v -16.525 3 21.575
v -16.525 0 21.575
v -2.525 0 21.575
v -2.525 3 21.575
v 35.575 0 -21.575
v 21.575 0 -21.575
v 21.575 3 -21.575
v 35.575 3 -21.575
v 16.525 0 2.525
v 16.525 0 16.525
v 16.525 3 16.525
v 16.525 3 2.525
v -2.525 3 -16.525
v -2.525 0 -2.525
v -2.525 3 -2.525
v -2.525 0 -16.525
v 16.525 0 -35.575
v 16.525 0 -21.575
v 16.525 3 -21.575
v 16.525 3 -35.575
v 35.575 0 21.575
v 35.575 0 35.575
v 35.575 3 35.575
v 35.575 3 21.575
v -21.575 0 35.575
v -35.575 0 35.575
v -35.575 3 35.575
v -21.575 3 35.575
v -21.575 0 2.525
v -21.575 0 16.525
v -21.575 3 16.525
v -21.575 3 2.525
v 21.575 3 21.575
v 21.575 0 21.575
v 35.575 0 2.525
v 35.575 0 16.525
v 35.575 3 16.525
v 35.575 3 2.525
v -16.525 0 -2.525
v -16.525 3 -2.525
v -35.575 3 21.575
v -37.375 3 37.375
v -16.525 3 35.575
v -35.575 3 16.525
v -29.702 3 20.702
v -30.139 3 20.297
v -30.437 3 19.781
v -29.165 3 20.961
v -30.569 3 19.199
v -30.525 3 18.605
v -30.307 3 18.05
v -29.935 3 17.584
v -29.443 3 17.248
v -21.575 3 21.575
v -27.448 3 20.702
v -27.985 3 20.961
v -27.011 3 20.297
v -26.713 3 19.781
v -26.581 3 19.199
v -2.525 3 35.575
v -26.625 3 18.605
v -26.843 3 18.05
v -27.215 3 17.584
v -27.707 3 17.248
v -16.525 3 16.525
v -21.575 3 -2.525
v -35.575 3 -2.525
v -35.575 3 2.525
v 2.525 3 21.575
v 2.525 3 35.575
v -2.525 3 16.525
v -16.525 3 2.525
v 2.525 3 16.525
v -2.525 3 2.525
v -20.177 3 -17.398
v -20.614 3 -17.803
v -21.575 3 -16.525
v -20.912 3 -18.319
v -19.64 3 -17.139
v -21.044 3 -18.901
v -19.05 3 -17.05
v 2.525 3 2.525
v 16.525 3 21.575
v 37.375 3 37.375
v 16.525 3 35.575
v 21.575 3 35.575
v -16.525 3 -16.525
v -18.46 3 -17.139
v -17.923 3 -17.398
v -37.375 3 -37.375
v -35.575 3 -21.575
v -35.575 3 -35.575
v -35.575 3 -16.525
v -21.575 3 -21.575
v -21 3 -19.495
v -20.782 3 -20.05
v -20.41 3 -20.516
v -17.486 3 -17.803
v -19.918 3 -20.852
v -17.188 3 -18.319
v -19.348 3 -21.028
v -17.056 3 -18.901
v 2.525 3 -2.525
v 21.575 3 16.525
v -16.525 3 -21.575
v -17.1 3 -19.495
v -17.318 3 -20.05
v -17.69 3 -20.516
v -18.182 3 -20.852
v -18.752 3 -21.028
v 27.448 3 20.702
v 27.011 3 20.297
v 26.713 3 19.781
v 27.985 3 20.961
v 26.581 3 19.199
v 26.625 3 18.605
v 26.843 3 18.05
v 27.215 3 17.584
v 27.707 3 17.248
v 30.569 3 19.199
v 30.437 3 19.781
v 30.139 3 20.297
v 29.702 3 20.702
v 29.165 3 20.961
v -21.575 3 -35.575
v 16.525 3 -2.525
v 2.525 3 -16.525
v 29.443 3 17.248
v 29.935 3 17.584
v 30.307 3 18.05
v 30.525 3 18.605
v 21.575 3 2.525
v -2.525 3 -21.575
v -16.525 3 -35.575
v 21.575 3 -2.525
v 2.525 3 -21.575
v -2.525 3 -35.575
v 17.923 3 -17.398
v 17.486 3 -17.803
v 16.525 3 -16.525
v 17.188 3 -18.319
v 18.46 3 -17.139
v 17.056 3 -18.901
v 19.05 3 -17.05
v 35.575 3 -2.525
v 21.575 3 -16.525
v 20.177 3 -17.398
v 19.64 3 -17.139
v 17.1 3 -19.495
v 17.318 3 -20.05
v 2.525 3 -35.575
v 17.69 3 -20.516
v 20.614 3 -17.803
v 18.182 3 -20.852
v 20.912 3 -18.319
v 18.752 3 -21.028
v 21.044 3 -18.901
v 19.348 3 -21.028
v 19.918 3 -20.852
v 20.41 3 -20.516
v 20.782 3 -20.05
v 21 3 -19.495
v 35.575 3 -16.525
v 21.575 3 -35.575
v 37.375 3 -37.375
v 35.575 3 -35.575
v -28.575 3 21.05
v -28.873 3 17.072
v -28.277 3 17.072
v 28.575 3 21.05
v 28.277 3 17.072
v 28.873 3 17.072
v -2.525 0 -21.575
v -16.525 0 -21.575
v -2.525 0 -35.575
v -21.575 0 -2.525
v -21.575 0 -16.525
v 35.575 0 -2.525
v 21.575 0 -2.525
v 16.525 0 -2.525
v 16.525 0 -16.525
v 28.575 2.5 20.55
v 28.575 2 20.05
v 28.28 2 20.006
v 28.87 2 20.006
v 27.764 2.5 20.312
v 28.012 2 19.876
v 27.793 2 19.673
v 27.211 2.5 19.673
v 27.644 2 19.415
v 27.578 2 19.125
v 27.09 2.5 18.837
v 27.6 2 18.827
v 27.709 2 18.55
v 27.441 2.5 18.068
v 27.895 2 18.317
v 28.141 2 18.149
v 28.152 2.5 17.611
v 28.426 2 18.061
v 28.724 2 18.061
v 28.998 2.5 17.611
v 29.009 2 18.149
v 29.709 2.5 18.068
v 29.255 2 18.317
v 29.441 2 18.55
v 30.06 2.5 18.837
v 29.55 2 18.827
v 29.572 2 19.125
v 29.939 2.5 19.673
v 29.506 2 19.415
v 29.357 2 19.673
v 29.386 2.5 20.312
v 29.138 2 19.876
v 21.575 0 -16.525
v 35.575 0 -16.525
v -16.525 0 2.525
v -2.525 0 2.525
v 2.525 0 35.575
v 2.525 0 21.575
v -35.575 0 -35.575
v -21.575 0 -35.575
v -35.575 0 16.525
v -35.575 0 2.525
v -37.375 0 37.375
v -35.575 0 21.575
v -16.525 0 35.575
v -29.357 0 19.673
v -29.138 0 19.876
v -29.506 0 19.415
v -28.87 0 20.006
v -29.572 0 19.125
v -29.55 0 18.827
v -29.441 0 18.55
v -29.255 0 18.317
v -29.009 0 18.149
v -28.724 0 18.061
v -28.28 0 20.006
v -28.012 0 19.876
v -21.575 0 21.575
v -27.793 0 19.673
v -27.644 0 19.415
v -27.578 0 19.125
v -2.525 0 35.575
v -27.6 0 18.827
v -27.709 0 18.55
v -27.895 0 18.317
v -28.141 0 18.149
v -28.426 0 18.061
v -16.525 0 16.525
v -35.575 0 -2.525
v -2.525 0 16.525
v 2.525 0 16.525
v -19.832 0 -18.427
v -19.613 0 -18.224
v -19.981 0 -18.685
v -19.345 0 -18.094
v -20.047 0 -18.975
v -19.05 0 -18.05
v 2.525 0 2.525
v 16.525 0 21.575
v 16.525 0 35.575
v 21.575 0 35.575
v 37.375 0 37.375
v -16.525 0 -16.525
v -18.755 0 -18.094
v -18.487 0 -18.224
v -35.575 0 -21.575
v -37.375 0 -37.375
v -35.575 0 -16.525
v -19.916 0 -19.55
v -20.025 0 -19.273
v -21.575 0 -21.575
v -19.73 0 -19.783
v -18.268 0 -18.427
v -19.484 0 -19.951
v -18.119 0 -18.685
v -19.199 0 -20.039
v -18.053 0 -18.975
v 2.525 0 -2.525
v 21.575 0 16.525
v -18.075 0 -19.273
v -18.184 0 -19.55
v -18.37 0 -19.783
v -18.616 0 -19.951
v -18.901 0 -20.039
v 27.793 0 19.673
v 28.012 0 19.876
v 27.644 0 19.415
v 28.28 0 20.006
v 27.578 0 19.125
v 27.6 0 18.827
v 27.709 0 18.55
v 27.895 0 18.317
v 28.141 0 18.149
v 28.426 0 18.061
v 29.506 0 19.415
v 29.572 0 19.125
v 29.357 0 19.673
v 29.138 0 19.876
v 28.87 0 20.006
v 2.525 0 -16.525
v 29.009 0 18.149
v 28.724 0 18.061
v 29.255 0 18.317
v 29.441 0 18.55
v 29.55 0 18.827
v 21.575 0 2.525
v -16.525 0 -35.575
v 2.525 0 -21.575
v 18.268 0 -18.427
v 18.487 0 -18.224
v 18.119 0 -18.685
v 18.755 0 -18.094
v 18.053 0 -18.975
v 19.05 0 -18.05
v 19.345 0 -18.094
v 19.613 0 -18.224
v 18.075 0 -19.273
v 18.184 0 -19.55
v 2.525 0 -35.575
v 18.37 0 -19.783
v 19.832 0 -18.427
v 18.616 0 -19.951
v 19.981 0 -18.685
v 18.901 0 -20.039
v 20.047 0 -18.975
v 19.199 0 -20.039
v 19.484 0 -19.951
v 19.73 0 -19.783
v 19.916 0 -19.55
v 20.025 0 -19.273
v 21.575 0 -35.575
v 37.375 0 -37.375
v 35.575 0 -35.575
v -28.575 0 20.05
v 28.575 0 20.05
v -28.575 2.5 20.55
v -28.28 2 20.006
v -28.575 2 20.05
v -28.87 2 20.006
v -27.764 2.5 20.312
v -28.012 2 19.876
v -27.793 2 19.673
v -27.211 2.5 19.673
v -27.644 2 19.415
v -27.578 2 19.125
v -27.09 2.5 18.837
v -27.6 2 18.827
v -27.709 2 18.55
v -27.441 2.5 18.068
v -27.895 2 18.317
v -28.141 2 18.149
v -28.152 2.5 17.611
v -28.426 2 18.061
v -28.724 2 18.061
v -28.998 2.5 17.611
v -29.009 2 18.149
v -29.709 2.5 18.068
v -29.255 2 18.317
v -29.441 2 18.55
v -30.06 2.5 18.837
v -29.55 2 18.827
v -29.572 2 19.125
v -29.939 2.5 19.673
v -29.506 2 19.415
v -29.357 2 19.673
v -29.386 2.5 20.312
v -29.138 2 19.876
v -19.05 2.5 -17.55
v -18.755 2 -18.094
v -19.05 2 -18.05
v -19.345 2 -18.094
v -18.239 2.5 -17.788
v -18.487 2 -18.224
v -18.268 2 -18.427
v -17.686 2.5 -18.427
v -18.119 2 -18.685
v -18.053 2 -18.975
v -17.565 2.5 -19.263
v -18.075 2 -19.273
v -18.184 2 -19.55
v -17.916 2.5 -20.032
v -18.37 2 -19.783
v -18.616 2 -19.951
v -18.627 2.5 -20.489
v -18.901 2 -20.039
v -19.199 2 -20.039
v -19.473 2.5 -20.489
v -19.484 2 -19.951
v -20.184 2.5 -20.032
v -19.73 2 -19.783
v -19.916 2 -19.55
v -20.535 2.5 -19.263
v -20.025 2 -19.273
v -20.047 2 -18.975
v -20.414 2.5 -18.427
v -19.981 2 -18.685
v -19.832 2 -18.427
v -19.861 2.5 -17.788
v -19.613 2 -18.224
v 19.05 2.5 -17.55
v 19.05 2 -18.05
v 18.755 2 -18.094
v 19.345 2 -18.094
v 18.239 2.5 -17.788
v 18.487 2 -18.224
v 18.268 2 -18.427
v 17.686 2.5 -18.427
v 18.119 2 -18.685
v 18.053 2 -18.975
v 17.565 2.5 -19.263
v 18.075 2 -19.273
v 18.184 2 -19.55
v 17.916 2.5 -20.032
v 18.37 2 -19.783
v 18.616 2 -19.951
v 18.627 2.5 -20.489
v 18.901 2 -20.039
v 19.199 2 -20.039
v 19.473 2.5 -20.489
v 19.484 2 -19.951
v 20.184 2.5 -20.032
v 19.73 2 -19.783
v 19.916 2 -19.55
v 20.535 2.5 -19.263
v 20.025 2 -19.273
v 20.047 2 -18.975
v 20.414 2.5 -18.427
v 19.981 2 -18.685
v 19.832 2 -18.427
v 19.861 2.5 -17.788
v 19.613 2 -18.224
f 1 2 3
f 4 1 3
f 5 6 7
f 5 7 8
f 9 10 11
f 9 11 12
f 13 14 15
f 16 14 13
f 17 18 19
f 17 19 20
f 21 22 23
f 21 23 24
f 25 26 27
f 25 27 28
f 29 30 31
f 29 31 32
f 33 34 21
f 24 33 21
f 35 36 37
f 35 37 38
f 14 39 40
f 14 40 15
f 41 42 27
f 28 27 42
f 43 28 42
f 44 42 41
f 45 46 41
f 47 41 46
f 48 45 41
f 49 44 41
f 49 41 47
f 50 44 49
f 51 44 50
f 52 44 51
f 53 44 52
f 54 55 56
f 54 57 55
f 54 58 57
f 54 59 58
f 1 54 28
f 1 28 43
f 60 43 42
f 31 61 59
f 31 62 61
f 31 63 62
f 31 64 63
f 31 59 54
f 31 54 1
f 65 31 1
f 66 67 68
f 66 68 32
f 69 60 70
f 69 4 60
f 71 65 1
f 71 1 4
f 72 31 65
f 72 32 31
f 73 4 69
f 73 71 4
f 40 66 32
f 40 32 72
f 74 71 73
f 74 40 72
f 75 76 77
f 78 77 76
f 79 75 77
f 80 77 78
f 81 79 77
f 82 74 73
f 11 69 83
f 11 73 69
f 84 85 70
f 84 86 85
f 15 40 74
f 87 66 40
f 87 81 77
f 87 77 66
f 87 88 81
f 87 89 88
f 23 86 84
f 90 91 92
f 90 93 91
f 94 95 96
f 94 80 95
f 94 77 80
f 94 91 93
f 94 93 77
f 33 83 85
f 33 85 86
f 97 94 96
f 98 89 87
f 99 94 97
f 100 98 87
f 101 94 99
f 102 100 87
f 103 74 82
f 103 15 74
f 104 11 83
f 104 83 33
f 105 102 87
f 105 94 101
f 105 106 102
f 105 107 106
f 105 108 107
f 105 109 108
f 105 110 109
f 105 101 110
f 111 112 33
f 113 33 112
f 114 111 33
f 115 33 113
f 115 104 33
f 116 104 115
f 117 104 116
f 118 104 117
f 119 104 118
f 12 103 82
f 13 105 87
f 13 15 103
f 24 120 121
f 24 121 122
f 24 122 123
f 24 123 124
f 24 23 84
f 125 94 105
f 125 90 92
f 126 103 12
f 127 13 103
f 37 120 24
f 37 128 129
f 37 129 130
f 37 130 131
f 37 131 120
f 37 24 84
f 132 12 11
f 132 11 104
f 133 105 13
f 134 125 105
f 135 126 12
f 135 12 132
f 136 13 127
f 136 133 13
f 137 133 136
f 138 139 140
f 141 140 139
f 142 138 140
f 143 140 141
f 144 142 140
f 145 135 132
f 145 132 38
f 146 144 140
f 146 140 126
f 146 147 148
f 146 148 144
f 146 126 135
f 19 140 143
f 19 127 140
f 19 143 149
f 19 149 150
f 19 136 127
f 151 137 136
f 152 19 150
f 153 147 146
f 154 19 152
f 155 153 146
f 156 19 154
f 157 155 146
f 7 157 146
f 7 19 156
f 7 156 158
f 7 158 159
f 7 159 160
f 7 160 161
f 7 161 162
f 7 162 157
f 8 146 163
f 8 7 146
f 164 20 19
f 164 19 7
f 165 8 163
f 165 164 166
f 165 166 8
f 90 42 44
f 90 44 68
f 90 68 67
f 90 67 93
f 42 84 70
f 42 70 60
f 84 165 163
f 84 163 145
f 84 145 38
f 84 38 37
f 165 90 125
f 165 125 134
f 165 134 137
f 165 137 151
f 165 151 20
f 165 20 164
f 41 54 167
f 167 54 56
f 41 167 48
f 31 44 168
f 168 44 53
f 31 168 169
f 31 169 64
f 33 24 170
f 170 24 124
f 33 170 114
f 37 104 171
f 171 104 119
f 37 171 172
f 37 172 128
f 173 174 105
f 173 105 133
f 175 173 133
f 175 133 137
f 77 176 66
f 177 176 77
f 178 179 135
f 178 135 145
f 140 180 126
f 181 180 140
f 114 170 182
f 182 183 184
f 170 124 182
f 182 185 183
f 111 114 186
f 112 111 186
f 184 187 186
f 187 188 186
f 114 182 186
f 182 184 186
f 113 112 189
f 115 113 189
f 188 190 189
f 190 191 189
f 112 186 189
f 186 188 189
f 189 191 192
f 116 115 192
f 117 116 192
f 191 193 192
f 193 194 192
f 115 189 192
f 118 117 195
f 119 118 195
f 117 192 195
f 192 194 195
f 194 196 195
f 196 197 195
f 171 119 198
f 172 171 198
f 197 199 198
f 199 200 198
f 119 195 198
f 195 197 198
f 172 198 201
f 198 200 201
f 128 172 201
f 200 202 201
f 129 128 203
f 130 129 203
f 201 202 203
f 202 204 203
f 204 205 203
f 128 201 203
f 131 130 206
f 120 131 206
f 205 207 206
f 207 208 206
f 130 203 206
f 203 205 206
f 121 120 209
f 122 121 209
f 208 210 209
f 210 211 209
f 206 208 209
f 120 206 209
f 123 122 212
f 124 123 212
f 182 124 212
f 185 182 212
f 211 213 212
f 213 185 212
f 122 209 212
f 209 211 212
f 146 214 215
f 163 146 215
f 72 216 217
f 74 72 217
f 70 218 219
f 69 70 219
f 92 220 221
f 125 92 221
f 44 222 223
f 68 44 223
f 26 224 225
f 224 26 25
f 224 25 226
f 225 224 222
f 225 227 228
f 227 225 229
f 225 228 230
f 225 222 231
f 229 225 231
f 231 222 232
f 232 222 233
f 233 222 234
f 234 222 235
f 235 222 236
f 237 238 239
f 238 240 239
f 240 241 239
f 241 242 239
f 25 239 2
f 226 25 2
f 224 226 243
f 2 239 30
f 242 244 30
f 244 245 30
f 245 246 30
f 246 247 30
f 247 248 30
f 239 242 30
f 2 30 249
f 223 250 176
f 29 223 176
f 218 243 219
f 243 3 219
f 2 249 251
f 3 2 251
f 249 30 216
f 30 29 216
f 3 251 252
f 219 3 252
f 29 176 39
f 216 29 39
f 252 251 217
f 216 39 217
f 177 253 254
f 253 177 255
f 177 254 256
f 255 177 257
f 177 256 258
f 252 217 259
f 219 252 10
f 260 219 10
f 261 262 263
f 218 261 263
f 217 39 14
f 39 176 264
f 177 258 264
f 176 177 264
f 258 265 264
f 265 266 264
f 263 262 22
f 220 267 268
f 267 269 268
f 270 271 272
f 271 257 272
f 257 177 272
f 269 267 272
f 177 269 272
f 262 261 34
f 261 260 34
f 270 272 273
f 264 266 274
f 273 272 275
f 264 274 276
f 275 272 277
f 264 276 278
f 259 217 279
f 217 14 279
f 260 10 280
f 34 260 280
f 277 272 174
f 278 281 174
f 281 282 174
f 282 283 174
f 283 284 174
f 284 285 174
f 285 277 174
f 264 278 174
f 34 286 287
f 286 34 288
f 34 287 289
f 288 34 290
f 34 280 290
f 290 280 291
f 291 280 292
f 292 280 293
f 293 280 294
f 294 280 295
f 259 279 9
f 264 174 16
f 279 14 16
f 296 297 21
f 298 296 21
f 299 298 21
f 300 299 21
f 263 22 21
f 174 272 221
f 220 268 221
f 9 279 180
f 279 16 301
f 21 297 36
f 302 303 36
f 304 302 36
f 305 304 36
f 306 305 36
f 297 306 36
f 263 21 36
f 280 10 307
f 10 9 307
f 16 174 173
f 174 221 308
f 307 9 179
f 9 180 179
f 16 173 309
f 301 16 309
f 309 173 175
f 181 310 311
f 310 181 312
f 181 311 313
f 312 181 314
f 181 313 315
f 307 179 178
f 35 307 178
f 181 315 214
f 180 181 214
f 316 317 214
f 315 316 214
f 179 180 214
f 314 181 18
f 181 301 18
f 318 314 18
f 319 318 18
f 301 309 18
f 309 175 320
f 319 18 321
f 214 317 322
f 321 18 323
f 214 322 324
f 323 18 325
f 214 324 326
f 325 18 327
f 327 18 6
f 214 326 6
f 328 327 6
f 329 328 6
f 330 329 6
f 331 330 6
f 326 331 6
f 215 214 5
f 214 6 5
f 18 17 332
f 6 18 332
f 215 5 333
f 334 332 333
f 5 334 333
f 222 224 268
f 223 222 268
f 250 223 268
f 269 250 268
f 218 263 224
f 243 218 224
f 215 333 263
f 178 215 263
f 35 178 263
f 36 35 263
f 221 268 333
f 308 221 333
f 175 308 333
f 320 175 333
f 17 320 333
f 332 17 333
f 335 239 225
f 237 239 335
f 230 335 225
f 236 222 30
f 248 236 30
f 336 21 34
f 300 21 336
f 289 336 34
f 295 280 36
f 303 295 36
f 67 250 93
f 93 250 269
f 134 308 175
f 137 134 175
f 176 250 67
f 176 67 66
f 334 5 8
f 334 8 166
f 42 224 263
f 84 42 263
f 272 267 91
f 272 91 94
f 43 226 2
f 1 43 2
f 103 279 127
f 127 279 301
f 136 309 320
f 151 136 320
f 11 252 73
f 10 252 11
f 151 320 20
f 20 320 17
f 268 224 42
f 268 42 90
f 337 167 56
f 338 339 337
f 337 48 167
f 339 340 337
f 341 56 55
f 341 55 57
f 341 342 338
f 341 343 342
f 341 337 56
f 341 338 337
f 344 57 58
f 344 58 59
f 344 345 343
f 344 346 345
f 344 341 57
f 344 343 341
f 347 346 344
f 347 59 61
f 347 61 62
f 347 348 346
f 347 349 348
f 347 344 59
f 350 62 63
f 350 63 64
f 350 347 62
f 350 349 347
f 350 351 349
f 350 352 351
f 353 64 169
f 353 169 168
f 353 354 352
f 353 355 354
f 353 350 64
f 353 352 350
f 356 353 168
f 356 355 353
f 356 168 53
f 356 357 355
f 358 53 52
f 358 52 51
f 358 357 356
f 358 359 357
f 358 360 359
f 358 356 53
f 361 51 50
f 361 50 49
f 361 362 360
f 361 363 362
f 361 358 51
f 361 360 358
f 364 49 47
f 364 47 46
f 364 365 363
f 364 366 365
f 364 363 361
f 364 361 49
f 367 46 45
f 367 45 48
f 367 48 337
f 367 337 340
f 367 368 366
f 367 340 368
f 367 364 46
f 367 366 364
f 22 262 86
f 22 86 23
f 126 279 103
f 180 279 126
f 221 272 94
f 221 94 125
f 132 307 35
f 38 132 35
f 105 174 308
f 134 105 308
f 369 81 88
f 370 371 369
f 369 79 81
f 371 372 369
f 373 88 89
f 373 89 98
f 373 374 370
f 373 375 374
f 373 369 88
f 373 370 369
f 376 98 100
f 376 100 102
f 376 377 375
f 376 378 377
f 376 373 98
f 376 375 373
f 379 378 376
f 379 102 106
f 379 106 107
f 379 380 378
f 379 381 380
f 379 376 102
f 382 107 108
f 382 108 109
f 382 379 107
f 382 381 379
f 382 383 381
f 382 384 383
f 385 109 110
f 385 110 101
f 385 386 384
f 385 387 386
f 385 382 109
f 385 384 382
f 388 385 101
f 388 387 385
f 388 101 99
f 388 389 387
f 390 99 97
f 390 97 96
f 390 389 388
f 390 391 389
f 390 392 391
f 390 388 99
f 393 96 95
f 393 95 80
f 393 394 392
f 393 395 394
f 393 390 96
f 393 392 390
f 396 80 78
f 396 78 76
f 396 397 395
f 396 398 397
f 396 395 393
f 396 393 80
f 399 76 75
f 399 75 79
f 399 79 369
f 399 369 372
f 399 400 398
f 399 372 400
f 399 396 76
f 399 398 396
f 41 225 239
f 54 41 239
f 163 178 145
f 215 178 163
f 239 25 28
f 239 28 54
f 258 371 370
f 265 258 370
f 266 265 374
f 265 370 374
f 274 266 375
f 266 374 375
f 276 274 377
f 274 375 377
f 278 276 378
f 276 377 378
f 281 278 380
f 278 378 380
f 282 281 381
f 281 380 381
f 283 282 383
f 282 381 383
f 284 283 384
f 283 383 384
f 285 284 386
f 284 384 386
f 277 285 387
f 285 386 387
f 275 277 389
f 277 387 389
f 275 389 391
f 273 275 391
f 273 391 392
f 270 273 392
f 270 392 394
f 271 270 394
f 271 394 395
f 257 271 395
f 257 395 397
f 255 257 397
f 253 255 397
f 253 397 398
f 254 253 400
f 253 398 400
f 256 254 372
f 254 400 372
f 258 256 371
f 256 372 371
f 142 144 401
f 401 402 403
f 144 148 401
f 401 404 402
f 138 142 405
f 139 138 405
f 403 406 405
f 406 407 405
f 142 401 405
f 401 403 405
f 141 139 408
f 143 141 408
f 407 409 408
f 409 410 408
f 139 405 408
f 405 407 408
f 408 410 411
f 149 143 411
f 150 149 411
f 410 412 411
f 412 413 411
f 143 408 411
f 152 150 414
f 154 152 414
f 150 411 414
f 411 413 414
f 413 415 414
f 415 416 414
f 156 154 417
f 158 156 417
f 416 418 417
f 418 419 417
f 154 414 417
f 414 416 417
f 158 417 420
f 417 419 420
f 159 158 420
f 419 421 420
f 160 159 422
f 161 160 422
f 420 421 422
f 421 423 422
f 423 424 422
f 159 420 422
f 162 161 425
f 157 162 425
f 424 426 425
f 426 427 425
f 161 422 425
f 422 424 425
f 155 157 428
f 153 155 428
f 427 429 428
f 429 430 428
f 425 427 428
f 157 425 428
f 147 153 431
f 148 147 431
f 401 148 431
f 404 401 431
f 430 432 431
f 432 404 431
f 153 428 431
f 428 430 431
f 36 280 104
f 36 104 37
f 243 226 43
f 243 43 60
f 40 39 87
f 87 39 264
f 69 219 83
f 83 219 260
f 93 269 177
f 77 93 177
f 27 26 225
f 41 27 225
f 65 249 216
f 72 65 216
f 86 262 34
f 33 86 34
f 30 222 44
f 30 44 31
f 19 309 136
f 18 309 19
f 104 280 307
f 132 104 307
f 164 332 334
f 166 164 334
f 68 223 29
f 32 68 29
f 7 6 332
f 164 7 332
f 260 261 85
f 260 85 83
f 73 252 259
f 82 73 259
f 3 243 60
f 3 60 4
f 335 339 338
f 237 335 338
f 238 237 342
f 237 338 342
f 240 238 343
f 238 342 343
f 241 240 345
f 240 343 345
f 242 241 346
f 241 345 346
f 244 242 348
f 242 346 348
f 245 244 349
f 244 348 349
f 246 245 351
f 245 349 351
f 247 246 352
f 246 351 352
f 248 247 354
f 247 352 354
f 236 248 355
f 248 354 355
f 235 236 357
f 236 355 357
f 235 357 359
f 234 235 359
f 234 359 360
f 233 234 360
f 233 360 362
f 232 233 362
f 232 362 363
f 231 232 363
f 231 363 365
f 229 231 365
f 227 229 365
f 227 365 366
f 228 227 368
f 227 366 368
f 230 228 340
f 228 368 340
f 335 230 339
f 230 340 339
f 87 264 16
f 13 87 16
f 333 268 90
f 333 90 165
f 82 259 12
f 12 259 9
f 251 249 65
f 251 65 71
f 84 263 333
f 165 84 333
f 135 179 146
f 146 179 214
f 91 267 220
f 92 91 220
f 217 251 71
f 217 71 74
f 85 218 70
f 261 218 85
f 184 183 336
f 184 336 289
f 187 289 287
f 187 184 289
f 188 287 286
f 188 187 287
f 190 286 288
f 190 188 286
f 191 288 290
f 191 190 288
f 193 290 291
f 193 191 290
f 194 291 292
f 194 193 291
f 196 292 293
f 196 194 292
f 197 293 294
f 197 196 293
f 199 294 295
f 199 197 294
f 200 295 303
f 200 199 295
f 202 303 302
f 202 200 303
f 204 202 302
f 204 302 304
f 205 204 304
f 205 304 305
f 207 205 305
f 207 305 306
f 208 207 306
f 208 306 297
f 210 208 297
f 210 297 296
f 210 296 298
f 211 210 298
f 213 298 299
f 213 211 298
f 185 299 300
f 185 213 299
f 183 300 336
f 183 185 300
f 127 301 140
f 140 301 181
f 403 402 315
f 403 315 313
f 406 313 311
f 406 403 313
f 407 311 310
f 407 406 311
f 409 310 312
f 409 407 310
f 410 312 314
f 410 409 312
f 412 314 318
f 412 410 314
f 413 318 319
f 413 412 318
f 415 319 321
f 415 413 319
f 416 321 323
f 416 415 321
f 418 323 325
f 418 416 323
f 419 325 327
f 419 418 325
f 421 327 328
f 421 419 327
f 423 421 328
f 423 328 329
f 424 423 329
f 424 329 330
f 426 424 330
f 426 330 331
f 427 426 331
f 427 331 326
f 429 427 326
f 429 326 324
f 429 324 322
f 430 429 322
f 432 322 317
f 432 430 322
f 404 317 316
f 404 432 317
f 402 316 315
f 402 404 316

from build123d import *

# Parameters (mm, degrees)
SKETCH1_W                = 75.15
SKETCH1_H                = 75.15
SKETCH1_W_2              = 14
SKETCH1_H_2              = 14
BOSS_EXTRUDE1_DEPTH      = 3
SKETCH2_R                = 1
CUT_EXTRUDE1_DEPTH       = 3
CHAMFER1_SIZE            = 1
CHAMFER1_OF_MIRROR1_SIZE = 1
MOVE_FACE1_BY            = 0.2
MOVE_FACE1_2_BY          = 0.2
MOVE_FACE1_3_BY          = 0.2
MOVE_FACE1_4_BY          = 0.2


with BuildPart() as part:
    # Sketch1 → Boss-Extrude1 (new body)
    with BuildSketch(Plane(origin=(0, 0, 0), x_dir=(1, 0, 0), z_dir=(0, 1, 0))):
        Rectangle(SKETCH1_W, SKETCH1_H)
        with Locations((-9.525, 28.575)):
            Rectangle(SKETCH1_W_2, SKETCH1_H_2, mode=Mode.SUBTRACT)
        with Locations((-28.575, 28.575)):
            Rectangle(SKETCH1_W_2, SKETCH1_H_2, mode=Mode.SUBTRACT)
        with Locations((9.525, 28.575)):
            Rectangle(SKETCH1_W_2, SKETCH1_H_2, mode=Mode.SUBTRACT)
        with Locations((28.575, 28.575)):
            Rectangle(SKETCH1_W_2, SKETCH1_H_2, mode=Mode.SUBTRACT)
        with Locations((-9.525, 9.525)):
            Rectangle(SKETCH1_W_2, SKETCH1_H_2, mode=Mode.SUBTRACT)
        with Locations((9.525, 9.525)):
            Rectangle(SKETCH1_W_2, SKETCH1_H_2, mode=Mode.SUBTRACT)
        with Locations((28.575, 9.525)):
            Rectangle(SKETCH1_W_2, SKETCH1_H_2, mode=Mode.SUBTRACT)
        with Locations((-9.525, -9.525)):
            Rectangle(SKETCH1_W_2, SKETCH1_H_2, mode=Mode.SUBTRACT)
        with Locations((9.525, -9.525)):
            Rectangle(SKETCH1_W_2, SKETCH1_H_2, mode=Mode.SUBTRACT)
        with Locations((28.575, -9.525)):
            Rectangle(SKETCH1_W_2, SKETCH1_H_2, mode=Mode.SUBTRACT)
        with Locations((-9.525, -28.575)):
            Rectangle(SKETCH1_W_2, SKETCH1_H_2, mode=Mode.SUBTRACT)
        with Locations((9.525, -28.575)):
            Rectangle(SKETCH1_W_2, SKETCH1_H_2, mode=Mode.SUBTRACT)
        with Locations((28.575, -28.575)):
            Rectangle(SKETCH1_W_2, SKETCH1_H_2, mode=Mode.SUBTRACT)
        with Locations((-28.575, 9.525)):
            Rectangle(SKETCH1_W_2, SKETCH1_H_2, mode=Mode.SUBTRACT)
        with Locations((-28.575, -9.525)):
            Rectangle(SKETCH1_W_2, SKETCH1_H_2, mode=Mode.SUBTRACT)
        with Locations((-28.575, -28.575)):
            Rectangle(SKETCH1_W_2, SKETCH1_H_2, mode=Mode.SUBTRACT)
    extrude(amount=BOSS_EXTRUDE1_DEPTH)

    # Sketch2 → Cut-Extrude1 (cut)
    with BuildSketch(Plane(origin=(0, 3, 0), x_dir=(1, 0, 0), z_dir=(0, 1, 0))):
        with Locations(Location((-19.05, 19.05, 0), (0, 0, 270))):
            Circle(SKETCH2_R)
        with Locations(Location((-28.575, -19.05, 0), (0, 0, 270))):
            Circle(SKETCH2_R)
    cut_extrude1 = extrude(amount=-CUT_EXTRUDE1_DEPTH, mode=Mode.SUBTRACT)

    # Chamfer1
    chamfer1_edges = [part.edges().sort_by_distance(p)[0] for p in [
        (-19.05, 3, -20.05),
        (-28.575, 3, 18.05),
    ]]
    chamfer(chamfer1_edges, length=CHAMFER1_SIZE)

    # Mirror1: Cut-Extrude1 across plane
    add(cut_extrude1.mirror(Plane(origin=(0, 0, 0), x_dir=(0, 0, 1), z_dir=(1, 0, 0))), mode=Mode.SUBTRACT)

    # Chamfer1 of Mirror1
    chamfer1_of_mirror1_edges = [part.edges().sort_by_distance(p)[0] for p in [
        (19.05, 3, -20.05),
        (28.575, 3, 18.05),
    ]]
    chamfer(chamfer1_of_mirror1_edges, length=CHAMFER1_OF_MIRROR1_SIZE)

    # Move Face1: a face moved inward by 0.2
    extrude(part.faces().sort_by_distance((37.575, 1.5, 0))[0], amount=MOVE_FACE1_BY, dir=(-1, 0, 0), mode=Mode.SUBTRACT)

    # Move Face1 2: a face moved inward by 0.2
    extrude(part.faces().sort_by_distance((0, 1.5, -37.575))[0], amount=MOVE_FACE1_2_BY, dir=(0, 0, 1), mode=Mode.SUBTRACT)

    # Move Face1 3: a face moved inward by 0.2
    extrude(part.faces().sort_by_distance((0, 1.5, 37.575))[0], amount=MOVE_FACE1_3_BY, dir=(0, 0, -1), mode=Mode.SUBTRACT)

    # Move Face1 4: a face moved inward by 0.2
    extrude(part.faces().sort_by_distance((-37.575, 1.5, 0))[0], amount=MOVE_FACE1_4_BY, dir=(1, 0, 0), mode=Mode.SUBTRACT)


solid = part.part
